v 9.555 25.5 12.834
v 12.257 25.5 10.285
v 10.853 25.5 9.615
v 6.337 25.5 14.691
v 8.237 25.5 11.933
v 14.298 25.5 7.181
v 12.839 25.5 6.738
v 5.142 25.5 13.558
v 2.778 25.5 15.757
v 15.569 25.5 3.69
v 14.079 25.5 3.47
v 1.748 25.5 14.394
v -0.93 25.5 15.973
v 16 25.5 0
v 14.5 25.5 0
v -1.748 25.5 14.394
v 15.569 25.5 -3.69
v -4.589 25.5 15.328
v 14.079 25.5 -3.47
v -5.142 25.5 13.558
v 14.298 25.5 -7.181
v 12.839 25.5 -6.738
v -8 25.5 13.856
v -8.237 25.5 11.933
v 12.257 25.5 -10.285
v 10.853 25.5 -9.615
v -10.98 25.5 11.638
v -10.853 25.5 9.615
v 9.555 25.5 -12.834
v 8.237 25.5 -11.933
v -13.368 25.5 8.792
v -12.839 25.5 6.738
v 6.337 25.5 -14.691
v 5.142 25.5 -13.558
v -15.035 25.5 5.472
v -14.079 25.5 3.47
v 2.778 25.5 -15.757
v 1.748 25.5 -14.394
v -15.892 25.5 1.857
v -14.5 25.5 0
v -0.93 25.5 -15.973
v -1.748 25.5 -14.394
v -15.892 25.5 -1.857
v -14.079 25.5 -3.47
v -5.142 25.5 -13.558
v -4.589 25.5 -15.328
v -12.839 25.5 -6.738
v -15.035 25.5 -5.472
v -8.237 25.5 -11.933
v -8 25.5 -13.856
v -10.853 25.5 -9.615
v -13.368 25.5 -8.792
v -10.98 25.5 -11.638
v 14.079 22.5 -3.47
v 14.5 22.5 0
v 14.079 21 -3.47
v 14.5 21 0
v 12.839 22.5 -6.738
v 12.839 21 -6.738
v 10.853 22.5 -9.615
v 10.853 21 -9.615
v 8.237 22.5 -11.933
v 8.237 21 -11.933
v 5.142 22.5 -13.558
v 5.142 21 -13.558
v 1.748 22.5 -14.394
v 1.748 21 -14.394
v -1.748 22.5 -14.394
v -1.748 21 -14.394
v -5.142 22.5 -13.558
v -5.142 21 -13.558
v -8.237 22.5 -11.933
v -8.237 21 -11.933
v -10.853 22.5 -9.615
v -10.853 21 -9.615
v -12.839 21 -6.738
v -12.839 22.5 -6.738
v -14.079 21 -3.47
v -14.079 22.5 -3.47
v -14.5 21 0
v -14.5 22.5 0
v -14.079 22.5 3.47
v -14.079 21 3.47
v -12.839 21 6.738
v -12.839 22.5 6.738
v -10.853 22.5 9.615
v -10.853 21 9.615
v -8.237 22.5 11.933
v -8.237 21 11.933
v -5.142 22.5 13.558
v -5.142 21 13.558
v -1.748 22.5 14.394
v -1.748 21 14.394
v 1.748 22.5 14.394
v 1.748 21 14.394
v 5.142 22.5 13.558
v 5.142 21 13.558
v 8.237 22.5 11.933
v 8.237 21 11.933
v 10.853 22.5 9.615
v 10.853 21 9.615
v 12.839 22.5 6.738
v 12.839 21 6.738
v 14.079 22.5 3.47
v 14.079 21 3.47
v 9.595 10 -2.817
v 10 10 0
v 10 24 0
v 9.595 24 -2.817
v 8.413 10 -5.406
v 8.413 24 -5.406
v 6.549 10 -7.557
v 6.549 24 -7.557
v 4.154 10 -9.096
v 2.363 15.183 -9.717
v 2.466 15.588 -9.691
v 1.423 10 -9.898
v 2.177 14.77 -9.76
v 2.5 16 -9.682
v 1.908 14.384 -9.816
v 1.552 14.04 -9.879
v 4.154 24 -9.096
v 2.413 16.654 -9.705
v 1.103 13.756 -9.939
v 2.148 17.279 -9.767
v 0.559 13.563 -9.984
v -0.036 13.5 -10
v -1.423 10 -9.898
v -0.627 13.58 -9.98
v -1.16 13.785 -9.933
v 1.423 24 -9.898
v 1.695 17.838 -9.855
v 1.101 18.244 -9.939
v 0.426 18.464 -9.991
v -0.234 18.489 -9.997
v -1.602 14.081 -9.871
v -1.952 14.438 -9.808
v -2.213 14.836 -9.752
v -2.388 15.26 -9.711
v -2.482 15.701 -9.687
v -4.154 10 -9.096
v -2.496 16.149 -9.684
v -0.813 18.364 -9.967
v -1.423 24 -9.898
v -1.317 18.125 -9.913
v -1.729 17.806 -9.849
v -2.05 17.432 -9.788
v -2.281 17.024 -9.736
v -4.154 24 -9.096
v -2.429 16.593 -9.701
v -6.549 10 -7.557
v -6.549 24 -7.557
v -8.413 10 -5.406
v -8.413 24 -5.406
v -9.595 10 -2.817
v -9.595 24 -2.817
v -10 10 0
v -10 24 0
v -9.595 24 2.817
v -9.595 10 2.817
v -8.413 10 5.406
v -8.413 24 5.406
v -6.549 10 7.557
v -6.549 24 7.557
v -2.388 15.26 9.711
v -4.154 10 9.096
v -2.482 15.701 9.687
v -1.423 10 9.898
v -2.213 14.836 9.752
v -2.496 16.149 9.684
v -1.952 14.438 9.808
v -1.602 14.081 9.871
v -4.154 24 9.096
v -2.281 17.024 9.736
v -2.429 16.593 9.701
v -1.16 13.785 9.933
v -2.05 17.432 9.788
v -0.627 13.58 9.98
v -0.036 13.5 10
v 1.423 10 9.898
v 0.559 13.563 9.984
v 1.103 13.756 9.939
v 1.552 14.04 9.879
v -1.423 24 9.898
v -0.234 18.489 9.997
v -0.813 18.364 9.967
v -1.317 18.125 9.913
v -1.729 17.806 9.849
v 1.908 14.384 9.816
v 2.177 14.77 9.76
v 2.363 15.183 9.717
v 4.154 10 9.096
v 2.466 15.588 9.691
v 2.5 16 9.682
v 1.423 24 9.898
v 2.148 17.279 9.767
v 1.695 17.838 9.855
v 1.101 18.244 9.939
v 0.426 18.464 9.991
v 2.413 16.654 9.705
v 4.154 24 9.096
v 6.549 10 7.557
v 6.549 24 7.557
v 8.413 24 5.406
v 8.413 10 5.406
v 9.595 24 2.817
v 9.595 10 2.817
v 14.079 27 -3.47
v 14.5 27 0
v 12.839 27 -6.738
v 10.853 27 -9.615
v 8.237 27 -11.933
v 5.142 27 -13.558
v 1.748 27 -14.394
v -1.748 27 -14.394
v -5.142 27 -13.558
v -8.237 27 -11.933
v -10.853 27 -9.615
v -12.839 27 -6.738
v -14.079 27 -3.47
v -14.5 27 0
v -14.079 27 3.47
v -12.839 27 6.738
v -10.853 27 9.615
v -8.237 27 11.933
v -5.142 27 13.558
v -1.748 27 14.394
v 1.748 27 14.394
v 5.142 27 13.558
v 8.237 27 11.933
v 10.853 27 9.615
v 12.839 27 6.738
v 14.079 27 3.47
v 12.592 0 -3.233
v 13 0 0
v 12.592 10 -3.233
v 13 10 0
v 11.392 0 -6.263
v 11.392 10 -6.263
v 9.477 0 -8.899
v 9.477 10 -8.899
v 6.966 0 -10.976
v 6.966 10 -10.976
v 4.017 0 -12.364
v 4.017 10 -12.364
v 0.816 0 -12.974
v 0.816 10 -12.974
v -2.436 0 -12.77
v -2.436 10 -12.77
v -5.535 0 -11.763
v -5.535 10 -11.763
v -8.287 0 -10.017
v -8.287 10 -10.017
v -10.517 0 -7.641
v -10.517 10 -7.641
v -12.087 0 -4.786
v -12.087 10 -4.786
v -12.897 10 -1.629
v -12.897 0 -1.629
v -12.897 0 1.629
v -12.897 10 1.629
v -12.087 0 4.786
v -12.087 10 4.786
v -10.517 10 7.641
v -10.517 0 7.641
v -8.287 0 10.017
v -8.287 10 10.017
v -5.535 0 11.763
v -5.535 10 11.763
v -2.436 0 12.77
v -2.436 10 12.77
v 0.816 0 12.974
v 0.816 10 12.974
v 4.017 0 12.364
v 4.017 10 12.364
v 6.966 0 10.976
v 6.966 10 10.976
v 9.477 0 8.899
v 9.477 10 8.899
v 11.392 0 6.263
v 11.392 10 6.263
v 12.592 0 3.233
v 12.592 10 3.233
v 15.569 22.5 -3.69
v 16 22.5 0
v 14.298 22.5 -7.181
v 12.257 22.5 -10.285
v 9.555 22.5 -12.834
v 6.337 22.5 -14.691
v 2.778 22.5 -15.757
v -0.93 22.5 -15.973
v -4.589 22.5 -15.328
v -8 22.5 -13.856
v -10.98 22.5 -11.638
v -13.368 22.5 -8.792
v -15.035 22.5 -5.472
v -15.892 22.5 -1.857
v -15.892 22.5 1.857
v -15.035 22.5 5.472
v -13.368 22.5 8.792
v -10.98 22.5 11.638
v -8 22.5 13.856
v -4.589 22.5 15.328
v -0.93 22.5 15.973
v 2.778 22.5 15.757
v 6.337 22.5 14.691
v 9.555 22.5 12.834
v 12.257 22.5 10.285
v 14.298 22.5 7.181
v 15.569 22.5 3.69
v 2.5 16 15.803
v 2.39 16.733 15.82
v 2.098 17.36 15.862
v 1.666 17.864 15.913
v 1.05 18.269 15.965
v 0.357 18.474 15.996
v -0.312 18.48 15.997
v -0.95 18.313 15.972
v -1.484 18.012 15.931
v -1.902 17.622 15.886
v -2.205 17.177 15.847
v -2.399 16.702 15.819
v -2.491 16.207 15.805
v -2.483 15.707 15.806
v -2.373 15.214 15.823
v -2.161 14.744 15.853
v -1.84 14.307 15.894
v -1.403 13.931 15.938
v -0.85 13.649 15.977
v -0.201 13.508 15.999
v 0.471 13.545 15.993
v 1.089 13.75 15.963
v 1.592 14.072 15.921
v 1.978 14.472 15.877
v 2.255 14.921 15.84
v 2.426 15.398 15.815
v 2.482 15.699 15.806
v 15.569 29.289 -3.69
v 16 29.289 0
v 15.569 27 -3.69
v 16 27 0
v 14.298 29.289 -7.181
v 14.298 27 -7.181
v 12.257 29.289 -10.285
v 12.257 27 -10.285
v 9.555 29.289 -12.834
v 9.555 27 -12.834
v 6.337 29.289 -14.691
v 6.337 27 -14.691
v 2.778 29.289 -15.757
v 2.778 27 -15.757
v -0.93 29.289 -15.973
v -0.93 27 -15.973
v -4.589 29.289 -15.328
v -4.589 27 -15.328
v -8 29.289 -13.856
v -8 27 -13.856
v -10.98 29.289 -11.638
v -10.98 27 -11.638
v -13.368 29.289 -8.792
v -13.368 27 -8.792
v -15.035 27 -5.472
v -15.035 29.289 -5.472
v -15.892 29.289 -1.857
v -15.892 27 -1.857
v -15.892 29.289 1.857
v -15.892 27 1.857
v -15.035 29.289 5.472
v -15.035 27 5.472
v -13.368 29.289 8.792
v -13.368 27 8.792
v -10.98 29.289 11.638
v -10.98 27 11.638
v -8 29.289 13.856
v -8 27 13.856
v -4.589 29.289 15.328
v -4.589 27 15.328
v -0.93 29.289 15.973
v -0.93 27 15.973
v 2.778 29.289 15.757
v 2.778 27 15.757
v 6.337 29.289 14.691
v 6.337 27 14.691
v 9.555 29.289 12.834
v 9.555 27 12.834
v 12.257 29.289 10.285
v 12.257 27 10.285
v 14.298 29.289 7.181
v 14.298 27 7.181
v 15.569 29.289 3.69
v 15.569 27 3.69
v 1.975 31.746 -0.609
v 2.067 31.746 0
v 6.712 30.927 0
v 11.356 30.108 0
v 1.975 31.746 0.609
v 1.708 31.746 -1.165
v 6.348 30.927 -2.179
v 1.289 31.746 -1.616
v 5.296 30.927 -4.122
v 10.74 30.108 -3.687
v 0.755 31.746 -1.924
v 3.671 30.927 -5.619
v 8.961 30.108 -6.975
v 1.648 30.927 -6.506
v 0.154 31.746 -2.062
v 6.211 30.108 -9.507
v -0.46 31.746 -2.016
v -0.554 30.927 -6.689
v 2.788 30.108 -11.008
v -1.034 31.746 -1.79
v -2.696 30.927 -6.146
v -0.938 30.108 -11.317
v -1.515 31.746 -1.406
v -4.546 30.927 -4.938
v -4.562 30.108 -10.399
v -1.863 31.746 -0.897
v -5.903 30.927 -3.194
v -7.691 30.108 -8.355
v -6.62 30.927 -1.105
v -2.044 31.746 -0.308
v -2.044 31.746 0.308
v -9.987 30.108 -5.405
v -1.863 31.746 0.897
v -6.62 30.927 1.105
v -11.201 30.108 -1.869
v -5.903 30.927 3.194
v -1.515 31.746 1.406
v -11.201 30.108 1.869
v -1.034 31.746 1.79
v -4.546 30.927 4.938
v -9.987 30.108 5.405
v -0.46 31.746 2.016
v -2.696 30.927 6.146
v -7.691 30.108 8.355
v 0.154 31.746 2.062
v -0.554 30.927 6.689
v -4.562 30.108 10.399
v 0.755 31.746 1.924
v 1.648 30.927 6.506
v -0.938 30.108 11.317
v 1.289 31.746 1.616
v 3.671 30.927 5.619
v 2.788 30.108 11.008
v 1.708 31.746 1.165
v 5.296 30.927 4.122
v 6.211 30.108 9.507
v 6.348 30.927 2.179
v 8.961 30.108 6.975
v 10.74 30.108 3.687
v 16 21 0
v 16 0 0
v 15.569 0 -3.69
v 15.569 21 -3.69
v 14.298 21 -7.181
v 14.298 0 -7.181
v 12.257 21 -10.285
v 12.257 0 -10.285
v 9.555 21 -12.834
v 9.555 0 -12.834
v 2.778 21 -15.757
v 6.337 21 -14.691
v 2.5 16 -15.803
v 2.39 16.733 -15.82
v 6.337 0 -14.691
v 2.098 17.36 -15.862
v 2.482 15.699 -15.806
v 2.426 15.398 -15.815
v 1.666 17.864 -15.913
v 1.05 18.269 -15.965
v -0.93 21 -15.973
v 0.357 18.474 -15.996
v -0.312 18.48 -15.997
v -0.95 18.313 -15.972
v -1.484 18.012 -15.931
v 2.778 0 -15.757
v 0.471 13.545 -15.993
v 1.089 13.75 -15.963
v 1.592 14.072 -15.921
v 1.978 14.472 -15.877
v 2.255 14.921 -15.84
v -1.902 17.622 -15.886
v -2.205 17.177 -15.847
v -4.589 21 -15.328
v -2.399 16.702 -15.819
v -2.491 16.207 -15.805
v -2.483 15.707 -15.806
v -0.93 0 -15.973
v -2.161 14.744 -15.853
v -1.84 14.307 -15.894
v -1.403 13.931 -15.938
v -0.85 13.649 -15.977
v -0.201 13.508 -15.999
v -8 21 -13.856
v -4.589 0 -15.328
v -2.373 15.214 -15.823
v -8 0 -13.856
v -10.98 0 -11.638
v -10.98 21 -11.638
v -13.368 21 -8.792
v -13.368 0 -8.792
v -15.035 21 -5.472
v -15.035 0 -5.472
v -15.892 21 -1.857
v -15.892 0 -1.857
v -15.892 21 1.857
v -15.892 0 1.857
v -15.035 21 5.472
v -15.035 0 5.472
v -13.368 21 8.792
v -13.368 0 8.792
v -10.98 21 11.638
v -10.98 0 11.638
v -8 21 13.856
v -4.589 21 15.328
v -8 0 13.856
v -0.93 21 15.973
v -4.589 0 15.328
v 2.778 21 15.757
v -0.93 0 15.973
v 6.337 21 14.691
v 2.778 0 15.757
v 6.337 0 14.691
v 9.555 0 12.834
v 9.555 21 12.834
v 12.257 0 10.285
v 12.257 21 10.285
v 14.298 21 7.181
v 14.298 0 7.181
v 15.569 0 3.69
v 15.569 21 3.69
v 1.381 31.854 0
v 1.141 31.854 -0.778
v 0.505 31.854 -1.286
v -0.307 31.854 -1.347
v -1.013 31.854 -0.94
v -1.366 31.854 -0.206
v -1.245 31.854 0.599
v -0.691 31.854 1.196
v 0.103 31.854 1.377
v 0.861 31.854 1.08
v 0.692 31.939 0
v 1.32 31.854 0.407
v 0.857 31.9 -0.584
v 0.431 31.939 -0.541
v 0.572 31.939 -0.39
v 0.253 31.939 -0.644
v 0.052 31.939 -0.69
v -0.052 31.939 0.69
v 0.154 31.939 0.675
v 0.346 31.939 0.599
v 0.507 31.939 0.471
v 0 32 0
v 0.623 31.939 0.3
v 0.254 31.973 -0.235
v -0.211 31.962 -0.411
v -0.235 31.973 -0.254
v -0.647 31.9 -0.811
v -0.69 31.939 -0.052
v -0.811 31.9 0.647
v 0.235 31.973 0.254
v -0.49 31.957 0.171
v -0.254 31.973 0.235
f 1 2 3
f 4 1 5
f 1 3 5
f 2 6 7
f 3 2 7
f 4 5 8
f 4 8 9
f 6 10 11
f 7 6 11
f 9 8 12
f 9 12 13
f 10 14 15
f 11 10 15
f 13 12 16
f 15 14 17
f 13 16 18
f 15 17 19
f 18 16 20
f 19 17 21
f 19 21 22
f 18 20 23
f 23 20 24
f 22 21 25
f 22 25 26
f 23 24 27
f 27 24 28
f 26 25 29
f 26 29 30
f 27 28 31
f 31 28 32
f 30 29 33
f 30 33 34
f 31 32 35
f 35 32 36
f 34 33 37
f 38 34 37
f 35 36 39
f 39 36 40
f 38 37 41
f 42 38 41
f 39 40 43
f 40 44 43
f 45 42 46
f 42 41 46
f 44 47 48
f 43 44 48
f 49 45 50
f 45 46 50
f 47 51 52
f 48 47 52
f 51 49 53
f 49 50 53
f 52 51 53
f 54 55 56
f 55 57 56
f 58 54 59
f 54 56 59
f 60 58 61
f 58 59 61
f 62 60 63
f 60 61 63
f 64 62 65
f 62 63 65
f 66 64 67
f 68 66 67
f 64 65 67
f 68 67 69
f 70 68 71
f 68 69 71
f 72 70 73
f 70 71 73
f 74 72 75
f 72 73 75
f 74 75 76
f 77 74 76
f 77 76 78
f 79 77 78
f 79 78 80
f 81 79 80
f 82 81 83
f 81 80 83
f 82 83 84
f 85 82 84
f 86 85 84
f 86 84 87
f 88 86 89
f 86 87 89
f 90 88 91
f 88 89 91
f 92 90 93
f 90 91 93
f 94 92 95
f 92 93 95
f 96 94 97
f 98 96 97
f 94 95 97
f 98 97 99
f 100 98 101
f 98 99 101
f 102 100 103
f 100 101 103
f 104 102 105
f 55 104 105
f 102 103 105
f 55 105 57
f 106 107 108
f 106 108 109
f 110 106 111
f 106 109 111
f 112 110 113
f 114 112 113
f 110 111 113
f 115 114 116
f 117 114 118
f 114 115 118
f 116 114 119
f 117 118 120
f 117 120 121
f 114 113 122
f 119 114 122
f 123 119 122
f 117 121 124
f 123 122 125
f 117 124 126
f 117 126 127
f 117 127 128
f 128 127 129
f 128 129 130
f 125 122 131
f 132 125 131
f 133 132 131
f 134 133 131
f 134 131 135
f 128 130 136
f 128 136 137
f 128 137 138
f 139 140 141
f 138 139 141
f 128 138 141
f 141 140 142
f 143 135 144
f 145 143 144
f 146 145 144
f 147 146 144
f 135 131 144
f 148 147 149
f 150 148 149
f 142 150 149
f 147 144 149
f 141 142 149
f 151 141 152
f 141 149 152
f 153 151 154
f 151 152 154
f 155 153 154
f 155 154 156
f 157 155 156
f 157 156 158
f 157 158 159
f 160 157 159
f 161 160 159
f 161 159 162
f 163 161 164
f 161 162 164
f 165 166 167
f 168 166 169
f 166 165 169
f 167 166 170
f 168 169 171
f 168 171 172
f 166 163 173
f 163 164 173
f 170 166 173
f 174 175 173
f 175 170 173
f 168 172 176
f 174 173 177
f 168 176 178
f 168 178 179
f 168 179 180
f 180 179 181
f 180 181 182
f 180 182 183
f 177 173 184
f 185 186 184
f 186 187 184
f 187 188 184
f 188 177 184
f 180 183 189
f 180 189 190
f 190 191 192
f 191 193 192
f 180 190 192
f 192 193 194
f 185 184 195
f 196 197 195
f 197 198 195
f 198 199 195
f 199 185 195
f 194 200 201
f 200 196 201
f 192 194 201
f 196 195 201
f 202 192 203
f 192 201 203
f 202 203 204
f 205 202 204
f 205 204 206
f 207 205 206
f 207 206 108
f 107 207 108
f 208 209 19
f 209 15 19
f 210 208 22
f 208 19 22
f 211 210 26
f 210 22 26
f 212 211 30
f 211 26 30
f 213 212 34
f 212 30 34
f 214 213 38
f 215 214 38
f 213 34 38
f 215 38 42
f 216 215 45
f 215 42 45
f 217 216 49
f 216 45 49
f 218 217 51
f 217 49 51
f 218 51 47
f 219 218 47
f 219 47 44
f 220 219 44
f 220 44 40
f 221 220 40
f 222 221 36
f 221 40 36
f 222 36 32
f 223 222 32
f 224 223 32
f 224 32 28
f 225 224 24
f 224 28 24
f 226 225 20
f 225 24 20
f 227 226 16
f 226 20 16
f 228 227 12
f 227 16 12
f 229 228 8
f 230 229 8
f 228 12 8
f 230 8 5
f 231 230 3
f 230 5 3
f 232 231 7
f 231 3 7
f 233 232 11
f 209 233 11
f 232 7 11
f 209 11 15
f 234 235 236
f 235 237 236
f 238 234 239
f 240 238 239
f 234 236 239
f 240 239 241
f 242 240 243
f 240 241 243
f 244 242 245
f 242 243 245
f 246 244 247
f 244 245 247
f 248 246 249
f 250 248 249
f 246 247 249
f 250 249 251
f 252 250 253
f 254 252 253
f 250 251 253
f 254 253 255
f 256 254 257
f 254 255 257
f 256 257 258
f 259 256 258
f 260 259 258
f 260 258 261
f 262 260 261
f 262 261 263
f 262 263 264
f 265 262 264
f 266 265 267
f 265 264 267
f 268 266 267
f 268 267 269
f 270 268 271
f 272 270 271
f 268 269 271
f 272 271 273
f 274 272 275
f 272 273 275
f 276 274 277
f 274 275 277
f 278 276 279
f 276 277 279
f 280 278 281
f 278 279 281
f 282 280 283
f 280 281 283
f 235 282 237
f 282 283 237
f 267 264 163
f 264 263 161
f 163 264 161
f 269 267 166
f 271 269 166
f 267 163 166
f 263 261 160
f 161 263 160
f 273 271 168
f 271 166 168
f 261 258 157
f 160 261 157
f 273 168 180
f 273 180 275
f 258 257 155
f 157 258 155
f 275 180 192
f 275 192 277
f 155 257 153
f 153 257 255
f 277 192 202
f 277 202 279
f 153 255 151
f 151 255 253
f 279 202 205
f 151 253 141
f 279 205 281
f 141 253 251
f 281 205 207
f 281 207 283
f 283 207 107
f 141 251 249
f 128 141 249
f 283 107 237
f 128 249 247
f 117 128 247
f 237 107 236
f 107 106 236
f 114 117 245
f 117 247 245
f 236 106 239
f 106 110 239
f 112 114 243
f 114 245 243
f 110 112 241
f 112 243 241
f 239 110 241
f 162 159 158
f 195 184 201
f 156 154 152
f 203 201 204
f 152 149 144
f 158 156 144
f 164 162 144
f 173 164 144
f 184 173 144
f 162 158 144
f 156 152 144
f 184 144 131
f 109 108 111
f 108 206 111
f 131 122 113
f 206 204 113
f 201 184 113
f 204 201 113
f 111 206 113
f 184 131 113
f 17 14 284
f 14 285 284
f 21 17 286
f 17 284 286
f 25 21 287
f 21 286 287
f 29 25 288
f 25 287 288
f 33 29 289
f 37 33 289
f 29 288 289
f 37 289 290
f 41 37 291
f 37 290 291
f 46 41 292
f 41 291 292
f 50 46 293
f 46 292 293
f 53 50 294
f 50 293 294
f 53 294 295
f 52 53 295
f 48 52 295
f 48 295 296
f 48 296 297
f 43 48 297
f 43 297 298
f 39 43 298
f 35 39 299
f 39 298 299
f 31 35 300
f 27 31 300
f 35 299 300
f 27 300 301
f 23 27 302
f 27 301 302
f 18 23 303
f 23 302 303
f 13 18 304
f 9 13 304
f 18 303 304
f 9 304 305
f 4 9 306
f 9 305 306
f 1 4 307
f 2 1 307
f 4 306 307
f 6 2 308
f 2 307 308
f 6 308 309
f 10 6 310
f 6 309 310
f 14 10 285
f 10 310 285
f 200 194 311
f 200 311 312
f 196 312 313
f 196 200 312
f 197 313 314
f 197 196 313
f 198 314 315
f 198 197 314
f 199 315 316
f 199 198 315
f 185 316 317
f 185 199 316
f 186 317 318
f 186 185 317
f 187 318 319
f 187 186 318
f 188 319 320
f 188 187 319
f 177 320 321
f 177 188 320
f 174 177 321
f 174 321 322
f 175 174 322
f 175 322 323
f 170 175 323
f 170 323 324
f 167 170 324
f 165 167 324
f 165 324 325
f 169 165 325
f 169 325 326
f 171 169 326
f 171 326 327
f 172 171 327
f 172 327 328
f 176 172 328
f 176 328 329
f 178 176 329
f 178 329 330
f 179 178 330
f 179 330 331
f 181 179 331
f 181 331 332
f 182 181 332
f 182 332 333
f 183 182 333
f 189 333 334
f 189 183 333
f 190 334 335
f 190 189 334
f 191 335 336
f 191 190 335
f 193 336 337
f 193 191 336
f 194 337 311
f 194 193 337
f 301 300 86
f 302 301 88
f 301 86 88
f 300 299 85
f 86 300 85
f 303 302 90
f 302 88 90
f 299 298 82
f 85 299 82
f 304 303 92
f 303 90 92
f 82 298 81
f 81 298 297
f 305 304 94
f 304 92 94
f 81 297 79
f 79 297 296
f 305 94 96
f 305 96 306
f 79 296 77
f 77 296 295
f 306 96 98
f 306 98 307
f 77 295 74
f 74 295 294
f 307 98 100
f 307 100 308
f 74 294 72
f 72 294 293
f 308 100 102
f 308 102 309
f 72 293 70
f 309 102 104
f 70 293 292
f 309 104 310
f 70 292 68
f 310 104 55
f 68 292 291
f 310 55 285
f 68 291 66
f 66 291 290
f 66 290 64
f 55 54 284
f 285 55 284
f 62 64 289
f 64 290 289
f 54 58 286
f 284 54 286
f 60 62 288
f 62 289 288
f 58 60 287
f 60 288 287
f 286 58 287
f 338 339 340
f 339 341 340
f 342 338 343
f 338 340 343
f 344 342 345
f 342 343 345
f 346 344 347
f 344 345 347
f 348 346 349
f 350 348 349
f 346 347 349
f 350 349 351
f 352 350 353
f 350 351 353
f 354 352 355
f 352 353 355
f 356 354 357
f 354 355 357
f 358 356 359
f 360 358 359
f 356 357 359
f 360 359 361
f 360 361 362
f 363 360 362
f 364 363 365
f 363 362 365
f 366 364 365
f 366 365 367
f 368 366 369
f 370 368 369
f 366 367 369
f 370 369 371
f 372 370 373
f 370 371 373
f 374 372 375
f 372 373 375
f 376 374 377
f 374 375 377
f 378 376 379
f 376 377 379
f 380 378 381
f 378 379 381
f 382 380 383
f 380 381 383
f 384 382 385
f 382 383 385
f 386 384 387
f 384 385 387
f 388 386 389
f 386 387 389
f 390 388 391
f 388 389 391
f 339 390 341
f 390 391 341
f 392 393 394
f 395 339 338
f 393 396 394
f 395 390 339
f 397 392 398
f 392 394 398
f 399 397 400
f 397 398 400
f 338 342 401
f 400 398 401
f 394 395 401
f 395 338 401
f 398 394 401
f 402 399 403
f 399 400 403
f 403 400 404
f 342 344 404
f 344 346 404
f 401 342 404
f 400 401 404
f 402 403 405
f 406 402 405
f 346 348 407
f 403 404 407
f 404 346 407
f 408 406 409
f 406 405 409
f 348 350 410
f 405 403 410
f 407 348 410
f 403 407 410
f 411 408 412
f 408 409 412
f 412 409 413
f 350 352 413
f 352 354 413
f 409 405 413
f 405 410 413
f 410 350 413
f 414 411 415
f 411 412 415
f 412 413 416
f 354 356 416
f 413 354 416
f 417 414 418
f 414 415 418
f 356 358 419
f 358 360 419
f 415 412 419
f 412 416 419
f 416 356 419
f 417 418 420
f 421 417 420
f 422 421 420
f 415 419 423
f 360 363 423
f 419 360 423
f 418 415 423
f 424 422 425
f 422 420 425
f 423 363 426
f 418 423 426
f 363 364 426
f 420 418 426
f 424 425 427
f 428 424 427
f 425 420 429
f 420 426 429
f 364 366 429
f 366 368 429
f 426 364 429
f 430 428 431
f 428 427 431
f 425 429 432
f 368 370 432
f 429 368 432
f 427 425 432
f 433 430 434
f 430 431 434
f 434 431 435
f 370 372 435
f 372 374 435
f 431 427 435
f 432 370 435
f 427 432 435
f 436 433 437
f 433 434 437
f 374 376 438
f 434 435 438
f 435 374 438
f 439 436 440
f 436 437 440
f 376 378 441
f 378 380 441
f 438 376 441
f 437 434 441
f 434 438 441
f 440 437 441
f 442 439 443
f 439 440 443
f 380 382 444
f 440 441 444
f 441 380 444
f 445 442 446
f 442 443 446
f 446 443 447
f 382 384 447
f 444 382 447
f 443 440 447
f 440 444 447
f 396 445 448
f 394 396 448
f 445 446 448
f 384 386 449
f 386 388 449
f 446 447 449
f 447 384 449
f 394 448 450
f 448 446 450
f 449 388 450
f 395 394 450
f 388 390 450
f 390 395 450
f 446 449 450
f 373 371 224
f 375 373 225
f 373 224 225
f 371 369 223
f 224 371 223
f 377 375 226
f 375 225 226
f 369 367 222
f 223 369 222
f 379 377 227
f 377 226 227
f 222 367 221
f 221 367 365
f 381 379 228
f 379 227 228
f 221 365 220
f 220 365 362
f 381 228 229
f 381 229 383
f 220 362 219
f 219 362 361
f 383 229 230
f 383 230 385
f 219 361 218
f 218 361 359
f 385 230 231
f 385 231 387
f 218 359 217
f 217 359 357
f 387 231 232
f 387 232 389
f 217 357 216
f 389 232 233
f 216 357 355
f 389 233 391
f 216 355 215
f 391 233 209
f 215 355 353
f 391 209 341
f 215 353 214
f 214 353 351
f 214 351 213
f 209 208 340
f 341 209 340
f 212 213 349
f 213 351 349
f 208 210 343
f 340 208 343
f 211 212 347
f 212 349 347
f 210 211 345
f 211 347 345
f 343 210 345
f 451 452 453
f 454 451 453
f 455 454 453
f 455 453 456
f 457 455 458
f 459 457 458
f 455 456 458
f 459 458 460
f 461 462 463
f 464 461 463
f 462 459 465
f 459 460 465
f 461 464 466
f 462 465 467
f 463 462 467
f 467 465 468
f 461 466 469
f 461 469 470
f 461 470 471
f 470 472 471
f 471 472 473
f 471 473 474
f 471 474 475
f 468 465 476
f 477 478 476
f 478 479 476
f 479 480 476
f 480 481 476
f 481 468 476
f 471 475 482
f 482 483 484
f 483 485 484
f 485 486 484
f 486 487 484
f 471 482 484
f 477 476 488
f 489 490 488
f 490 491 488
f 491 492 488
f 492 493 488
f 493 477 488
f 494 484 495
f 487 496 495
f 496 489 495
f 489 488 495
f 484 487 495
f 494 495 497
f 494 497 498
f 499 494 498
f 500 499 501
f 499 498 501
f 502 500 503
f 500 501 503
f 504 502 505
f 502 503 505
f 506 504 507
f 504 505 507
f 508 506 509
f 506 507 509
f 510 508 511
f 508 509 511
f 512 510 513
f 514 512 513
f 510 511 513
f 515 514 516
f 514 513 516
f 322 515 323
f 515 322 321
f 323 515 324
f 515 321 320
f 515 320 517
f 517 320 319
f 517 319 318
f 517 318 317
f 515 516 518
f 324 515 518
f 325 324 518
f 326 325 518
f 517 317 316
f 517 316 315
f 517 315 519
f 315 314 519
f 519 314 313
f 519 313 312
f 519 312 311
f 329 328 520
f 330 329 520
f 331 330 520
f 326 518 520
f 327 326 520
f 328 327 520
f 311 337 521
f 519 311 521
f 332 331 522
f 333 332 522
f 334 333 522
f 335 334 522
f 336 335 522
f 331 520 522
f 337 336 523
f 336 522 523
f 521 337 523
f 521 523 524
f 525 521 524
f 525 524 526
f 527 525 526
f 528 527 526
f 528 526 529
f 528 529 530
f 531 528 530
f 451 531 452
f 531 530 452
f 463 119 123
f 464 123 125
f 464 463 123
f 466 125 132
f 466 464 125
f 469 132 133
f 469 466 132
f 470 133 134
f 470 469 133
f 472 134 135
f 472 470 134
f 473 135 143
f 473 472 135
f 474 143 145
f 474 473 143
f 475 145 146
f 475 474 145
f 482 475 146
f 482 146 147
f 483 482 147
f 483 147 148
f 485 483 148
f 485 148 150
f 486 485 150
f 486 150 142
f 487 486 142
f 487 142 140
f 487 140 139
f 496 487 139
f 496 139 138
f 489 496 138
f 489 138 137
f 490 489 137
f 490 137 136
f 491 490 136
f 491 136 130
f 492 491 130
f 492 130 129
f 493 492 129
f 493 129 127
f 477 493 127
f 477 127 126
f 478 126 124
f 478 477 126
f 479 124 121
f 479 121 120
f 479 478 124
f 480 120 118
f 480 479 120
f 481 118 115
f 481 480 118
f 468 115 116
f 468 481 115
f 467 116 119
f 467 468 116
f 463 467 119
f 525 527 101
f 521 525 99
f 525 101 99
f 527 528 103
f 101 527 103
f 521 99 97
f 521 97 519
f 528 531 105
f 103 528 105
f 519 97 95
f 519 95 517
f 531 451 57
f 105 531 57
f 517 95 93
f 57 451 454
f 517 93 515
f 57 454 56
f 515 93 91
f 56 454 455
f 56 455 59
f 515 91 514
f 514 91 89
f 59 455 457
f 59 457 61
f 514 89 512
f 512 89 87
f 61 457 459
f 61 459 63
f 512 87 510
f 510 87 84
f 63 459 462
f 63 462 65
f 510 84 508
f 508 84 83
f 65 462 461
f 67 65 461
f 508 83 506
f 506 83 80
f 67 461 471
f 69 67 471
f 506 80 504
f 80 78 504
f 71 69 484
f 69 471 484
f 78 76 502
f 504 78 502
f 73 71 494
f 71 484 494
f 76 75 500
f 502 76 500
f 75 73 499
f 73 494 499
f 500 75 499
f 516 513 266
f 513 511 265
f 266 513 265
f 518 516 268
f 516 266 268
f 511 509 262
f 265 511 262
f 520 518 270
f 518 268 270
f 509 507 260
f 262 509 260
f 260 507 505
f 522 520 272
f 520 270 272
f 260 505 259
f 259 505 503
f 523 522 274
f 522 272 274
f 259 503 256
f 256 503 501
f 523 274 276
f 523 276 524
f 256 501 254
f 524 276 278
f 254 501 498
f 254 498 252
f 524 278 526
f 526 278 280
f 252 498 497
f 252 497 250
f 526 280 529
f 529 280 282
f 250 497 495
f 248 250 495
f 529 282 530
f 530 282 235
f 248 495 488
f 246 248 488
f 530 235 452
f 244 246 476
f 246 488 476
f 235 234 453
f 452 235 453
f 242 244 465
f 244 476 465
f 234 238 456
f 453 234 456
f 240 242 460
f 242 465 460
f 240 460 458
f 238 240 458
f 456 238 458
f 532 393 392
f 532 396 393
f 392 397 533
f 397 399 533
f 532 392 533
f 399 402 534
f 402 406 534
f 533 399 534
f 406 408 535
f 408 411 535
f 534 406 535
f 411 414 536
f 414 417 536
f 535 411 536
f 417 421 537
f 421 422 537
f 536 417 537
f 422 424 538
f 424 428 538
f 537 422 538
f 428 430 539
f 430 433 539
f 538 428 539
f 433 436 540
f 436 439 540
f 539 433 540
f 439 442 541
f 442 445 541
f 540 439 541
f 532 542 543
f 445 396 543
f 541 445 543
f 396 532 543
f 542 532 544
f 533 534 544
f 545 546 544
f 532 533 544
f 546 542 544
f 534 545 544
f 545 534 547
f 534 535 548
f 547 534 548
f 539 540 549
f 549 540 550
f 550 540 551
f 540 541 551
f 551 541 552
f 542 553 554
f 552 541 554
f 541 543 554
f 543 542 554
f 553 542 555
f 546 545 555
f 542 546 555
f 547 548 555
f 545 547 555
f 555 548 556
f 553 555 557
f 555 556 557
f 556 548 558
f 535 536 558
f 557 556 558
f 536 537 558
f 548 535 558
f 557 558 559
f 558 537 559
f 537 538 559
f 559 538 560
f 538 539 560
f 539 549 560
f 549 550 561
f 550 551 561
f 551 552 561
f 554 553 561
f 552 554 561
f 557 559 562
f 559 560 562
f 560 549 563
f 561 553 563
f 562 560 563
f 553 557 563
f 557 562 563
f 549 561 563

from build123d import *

# Parameters (mm, degrees)
CUT_EXTRUDE1_DEPTH      = 40.191835966
CUT_EXTRUDE1_DEPTH_BACK = 40.191835966
SKETCH3_R               = 2.5


with BuildPart() as part:
    # Sketch2 → Revolve1 (revolve)
    with BuildSketch(Plane.XY):
        with BuildLine():
            Line((16, 27), (14.5, 27))
            Line((14.5, 27), (14.5, 25.5))
            Line((14.5, 25.5), (16, 25.5))
            Line((16, 25.5), (16, 22.5))
            Line((16, 22.5), (14.5, 22.5))
            Line((14.5, 22.5), (14.5, 21))
            Line((14.5, 21), (16, 21))
            Line((16, 21), (16, 0))
            Line((16, 0), (13, 0))
            Line((13, 0), (13, 10))
            Line((13, 10), (10, 10))
            Line((10, 10), (10, 24))
            Line((10, 24), (0, 24))
            Line((0, 24), (0, 32))
            ThreePointArc((0, 32), (1.036981818, 31.899736945), (2.067335712, 31.745610948))
            Line((2.067335712, 31.745610948), (16, 29.288906321))
            Line((16, 29.288906321), (16, 27))
        make_face()
    revolve(axis=Axis((0, 0, 0), (0, 1, 0)))

    # Sketch3 → Cut-Extrude1 (cut, two sides: drawn at the far end of the back side and taken through both)
    with BuildSketch(Plane.XY.offset(-CUT_EXTRUDE1_DEPTH_BACK)):
        with Locations((0, 16)):
            Circle(SKETCH3_R)
    extrude(amount=CUT_EXTRUDE1_DEPTH + CUT_EXTRUDE1_DEPTH_BACK, mode=Mode.SUBTRACT)


solid = part.part
